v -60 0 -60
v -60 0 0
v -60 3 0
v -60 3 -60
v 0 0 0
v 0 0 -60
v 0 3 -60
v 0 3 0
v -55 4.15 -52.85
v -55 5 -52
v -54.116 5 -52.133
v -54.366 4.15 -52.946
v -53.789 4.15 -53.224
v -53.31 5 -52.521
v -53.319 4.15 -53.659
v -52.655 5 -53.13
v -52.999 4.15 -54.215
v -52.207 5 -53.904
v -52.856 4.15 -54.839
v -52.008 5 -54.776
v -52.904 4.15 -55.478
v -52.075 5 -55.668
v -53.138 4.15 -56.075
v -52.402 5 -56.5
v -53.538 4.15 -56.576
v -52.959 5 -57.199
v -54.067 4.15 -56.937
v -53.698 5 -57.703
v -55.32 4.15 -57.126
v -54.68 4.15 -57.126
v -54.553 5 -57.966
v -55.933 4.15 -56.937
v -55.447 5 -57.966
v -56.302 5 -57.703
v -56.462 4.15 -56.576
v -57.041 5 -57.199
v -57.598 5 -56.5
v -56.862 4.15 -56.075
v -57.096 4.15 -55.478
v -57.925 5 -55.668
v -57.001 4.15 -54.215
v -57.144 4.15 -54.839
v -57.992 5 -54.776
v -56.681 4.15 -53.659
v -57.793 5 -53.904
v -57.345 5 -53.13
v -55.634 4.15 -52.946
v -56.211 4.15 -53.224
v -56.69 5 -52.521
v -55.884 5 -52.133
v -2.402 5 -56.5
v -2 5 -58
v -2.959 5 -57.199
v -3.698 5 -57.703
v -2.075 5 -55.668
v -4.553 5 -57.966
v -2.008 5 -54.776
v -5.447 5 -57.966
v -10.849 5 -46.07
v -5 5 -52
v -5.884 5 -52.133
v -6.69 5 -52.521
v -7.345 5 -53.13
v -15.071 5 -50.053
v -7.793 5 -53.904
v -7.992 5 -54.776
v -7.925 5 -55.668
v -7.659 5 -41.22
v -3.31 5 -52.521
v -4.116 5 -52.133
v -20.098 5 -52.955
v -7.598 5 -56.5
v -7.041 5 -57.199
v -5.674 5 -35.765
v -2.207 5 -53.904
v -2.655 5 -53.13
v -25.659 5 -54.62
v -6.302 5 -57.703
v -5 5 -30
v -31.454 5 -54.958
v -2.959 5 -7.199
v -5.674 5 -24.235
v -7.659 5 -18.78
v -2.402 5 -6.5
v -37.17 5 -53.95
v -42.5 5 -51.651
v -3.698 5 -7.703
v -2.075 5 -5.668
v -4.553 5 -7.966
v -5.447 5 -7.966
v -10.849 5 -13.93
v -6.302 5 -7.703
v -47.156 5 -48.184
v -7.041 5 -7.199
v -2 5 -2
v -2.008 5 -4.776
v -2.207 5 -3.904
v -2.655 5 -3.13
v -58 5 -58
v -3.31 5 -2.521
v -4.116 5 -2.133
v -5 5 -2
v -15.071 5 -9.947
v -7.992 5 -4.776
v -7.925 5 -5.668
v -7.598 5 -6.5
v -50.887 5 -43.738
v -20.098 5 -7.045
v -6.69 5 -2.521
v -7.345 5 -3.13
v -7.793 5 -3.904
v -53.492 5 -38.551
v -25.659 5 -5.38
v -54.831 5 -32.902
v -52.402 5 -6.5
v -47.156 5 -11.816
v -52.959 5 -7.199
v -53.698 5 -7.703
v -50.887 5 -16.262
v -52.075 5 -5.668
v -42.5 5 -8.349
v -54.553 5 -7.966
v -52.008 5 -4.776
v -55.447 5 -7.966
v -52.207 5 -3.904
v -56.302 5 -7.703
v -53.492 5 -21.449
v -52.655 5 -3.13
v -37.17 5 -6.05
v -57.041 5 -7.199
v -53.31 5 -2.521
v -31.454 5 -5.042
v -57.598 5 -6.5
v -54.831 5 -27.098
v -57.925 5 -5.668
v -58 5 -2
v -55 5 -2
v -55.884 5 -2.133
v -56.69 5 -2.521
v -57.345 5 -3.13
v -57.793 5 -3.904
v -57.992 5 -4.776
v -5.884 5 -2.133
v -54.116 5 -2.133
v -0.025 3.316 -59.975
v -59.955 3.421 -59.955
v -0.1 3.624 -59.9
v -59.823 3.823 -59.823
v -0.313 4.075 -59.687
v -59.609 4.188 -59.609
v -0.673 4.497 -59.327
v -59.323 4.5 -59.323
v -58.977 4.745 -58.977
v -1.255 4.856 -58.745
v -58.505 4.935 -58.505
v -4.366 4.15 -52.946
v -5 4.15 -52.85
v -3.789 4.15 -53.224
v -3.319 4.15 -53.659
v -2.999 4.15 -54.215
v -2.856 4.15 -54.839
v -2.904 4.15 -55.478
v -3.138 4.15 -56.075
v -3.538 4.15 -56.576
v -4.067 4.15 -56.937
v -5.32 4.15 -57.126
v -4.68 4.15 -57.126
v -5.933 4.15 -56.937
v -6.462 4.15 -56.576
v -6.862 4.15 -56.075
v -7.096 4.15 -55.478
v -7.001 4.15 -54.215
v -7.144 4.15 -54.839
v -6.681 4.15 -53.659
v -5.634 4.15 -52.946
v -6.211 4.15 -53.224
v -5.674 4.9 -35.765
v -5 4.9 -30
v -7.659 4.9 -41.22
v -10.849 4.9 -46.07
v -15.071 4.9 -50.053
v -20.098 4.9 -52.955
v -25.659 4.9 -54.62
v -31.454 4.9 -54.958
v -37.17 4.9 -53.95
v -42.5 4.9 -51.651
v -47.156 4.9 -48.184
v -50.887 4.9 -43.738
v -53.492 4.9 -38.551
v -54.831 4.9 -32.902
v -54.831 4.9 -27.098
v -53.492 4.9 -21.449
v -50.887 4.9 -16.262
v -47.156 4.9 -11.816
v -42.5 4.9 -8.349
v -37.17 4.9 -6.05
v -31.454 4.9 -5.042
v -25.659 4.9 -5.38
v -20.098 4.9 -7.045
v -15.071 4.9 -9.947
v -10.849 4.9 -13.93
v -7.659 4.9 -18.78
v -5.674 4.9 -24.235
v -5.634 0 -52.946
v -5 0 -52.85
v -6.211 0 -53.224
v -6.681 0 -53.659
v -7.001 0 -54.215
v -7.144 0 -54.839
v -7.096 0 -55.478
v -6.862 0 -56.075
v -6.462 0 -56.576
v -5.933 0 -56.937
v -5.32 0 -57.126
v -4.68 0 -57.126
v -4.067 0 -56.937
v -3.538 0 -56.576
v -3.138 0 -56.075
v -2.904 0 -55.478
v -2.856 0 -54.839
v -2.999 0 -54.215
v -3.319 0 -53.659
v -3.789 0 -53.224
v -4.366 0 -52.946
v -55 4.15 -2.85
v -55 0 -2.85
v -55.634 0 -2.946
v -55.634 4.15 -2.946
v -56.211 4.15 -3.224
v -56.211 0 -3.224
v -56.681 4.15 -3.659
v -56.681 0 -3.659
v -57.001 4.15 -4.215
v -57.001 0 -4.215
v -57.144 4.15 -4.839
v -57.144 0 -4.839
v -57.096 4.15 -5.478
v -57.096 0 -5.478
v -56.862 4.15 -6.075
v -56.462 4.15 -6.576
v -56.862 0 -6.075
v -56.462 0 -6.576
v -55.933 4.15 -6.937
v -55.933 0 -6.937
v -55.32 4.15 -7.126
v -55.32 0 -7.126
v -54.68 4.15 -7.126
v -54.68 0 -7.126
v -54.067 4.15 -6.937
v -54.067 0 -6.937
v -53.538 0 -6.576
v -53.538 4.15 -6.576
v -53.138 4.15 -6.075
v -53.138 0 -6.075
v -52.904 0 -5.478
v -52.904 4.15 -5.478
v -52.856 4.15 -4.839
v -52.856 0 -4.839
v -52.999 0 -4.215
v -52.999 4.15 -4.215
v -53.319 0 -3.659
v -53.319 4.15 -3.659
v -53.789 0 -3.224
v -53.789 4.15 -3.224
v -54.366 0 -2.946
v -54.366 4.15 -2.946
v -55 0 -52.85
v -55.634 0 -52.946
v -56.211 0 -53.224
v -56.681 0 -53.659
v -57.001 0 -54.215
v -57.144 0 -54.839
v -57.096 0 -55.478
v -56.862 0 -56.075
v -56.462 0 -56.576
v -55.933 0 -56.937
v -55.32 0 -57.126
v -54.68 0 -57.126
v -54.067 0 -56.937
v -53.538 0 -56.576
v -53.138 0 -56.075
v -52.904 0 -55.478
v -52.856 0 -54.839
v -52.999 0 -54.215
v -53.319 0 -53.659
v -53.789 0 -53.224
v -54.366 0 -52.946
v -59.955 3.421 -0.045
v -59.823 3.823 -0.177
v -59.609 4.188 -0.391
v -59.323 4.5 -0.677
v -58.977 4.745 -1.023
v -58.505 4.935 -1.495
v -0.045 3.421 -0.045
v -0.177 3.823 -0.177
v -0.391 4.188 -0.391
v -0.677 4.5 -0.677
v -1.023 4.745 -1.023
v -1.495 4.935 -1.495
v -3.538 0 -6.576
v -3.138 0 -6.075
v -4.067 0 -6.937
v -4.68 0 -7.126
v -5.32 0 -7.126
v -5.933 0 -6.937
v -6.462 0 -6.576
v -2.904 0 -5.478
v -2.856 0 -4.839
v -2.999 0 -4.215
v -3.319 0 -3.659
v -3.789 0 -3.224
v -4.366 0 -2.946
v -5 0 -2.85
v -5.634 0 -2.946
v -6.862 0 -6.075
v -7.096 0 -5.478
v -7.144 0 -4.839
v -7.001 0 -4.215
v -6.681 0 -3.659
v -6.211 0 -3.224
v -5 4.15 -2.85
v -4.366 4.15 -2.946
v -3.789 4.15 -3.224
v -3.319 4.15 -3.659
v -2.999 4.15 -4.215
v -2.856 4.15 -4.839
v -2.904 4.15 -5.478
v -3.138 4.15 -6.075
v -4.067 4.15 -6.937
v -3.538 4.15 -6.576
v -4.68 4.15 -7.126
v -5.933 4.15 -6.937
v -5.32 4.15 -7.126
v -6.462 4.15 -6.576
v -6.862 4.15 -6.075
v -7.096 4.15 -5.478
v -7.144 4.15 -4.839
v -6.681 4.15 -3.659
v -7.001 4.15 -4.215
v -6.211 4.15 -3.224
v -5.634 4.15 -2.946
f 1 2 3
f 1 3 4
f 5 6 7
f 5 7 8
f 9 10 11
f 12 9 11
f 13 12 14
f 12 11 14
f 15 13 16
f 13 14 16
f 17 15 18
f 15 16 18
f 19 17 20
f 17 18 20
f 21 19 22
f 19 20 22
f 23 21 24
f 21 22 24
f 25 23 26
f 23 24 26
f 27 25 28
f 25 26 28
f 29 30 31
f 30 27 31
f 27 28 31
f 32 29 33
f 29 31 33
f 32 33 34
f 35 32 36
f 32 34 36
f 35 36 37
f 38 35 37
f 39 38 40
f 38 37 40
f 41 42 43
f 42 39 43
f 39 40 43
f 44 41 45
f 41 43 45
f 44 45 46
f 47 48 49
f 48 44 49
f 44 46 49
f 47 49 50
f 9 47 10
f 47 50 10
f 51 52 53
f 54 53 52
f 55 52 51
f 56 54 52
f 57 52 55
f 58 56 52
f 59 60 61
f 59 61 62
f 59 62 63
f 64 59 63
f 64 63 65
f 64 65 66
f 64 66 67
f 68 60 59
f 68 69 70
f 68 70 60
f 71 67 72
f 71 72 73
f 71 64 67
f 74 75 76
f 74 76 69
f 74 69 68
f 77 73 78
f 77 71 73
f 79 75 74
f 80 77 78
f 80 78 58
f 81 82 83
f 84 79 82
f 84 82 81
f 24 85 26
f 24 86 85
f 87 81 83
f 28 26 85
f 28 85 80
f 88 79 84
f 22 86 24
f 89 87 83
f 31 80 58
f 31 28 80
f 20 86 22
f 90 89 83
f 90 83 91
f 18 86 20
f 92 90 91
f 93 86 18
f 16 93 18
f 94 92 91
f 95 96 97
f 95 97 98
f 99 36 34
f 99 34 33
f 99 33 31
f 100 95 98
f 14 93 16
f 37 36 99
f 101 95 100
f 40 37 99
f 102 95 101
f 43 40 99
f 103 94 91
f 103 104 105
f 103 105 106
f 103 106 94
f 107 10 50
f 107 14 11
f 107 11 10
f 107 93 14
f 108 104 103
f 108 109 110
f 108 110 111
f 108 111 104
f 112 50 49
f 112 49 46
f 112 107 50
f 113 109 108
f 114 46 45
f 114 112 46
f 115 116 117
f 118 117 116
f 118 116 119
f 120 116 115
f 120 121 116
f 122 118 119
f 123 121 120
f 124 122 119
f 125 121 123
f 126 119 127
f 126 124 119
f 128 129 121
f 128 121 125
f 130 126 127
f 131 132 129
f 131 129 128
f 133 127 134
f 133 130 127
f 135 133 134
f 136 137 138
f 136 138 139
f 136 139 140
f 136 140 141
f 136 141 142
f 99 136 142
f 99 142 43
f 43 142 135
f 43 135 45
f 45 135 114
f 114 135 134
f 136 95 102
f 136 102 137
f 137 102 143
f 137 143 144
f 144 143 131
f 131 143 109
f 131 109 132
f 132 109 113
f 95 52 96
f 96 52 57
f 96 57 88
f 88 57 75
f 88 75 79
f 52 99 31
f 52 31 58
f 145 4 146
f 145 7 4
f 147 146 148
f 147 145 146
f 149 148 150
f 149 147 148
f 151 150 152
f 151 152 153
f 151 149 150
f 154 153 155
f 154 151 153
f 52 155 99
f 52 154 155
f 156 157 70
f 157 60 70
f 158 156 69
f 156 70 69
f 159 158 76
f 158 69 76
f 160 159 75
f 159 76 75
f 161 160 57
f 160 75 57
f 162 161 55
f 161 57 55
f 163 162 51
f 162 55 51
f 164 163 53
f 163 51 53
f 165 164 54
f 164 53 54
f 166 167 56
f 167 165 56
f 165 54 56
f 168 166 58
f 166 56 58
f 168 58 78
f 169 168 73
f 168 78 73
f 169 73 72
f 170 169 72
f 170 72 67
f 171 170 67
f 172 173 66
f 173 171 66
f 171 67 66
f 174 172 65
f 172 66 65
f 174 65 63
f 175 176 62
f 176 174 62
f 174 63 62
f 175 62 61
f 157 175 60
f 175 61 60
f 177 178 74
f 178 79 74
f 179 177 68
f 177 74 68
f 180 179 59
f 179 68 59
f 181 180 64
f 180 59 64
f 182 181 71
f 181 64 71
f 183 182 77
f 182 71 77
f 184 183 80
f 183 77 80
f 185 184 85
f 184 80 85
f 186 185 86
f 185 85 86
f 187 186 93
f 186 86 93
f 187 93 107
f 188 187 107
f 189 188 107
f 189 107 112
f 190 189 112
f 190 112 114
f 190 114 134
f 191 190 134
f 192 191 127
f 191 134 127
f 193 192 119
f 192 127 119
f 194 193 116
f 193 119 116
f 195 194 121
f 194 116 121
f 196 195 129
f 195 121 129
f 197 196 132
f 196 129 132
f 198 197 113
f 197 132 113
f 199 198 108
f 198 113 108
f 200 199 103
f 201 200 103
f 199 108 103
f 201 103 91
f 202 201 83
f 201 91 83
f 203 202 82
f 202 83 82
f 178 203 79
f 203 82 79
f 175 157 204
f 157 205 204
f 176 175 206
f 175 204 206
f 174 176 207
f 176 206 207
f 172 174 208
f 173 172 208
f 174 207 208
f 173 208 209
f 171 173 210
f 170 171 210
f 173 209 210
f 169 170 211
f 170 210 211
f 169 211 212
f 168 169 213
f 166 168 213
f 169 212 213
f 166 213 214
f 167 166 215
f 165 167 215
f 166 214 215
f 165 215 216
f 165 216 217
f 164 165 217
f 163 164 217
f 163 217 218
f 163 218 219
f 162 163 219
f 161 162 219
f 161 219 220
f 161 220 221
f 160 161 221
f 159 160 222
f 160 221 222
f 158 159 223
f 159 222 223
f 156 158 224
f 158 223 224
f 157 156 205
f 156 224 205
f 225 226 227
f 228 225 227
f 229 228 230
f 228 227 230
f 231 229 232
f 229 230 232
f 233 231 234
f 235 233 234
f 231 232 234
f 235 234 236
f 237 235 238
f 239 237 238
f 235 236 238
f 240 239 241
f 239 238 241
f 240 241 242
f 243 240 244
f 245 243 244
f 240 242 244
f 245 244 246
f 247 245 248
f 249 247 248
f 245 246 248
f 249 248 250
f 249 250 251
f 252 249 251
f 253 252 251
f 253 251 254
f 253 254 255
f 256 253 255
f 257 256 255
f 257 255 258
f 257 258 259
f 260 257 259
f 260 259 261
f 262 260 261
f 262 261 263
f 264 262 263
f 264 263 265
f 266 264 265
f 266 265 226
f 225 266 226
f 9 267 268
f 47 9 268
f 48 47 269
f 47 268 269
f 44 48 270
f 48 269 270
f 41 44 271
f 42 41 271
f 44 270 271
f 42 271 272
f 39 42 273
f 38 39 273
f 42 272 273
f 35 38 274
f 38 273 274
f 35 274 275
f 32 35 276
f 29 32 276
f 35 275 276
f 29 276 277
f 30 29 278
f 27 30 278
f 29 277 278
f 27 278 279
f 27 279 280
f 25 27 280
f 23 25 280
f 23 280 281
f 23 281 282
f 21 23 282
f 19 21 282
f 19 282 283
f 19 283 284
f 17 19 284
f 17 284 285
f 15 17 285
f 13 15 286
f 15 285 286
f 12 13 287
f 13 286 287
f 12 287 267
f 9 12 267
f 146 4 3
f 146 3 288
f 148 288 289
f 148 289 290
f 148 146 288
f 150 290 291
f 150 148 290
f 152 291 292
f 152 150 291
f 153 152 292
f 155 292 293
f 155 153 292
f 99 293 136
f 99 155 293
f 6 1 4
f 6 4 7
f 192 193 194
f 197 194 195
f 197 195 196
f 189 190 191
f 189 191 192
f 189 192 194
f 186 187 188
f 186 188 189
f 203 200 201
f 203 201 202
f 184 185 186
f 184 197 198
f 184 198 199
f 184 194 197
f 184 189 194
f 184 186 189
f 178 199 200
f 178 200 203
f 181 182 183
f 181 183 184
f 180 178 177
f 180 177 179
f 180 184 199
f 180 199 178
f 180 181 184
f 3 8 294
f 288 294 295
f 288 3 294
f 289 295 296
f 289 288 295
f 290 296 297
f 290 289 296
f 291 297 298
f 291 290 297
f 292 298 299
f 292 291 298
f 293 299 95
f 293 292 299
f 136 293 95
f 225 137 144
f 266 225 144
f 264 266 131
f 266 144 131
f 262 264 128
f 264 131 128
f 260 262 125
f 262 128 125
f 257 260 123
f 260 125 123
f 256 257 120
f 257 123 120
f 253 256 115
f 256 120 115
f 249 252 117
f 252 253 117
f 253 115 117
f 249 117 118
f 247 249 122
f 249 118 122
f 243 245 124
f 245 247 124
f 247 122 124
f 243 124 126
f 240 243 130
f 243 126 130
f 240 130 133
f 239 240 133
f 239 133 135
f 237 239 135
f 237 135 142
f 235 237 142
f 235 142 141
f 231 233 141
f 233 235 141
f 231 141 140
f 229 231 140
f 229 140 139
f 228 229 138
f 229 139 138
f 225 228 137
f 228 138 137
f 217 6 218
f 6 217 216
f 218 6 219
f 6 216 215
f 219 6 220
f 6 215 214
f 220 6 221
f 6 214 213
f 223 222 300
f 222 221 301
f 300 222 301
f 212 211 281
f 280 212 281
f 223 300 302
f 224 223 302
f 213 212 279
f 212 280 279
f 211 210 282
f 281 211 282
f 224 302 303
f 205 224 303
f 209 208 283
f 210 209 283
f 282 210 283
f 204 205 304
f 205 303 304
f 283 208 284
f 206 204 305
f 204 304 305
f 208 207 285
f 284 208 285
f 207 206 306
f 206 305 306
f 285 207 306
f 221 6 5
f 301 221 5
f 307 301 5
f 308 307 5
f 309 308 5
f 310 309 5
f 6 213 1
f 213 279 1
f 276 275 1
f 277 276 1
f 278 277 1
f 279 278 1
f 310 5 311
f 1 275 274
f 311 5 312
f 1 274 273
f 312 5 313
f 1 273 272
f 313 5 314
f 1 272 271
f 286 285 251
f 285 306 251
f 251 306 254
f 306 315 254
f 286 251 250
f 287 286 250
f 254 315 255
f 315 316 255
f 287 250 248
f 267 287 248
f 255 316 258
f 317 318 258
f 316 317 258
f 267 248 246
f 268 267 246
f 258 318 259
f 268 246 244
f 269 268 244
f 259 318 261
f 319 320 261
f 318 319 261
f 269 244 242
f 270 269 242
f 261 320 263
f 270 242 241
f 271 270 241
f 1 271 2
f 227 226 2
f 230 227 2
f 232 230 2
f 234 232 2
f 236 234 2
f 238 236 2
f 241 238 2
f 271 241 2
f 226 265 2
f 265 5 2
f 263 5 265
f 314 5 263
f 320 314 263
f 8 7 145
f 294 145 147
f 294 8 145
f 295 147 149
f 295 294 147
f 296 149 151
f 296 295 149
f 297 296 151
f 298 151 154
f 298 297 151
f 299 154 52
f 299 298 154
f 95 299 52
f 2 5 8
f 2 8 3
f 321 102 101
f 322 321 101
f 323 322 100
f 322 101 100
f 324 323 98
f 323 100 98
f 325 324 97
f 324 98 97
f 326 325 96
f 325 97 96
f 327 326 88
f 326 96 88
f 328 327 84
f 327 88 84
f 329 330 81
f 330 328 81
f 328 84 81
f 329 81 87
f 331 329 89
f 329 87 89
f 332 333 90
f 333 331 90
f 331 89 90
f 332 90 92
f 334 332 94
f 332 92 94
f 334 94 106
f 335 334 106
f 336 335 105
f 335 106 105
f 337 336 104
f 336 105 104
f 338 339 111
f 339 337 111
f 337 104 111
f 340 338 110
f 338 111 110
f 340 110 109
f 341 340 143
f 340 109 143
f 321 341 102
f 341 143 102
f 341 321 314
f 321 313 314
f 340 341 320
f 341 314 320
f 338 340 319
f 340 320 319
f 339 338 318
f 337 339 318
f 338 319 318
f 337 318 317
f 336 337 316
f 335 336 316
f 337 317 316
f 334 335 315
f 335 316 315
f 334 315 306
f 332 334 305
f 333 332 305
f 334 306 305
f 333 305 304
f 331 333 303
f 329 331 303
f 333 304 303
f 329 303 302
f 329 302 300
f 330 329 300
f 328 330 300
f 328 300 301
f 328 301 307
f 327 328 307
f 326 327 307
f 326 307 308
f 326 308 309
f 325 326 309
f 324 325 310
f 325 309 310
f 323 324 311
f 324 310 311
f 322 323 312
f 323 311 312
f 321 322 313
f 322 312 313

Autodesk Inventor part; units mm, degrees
ref_plane "YZ Plane" through (0, 0, 0) normal (1, 0, 0) x (0, 1, 0)
ref_plane "XZ Plane" through (0, 0, 0) normal (0, 1, 0) x (-1, 0, 0)
ref_plane "XY Plane" through (0, 0, 0) normal (0, 0, 1) x (1, 0, 0)
sketch "Sketch1" plane through (0, 0, 0) normal (0, 1, 0) x (-1, 0, 0)
  line L0 (0, 0) -> (60, 0)
  line L1 (60, 0) -> (60, -60)
  line L2 (60, -60) -> (0, -60)
  line L3 (0, -60) -> (0, 0)
  dimension "d0" = 60
  dimension "d1" = 60
extrude "Extrusion1" add sketch "Sketch1" along normal blind 5
sketch "Sketch2" plane through (0, 5, 0) normal (0, 1, 0) x (1, 0, 0)
  line L0 (-60, 0) -> (0, 0) projected
  line L1 (0, 0) -> (0, 60) projected
  line L2 (0, 60) -> (-60, 60) projected
  line L3 (-60, 60) -> (-60, 0) projected
  point P0 (-5, 5)
  point P1 (-5, 55)
  point P2 (-55, 55)
  point P3 (-55, 5)
  dimension "d4" = 5
  dimension "d6" = 5
  dimension "d7" = 5
  dimension "d8" = 5
  dimension "d9" = 5
  dimension "d10" = 5
  dimension "d11" = 5
  dimension "d12" = 5
hole "Hole1" at (-5, 5, -5) at (-5, 5, -55) at (-55, 5, -55) at (-55, 5, -5) direction (0, -1, 0) diameter 4.3 end through all countersink diameter 6 countersink angle 90
fillet "Fillet1" radius 2 4 edges at (-30, 5, 0) (-60, 5, -30) (-30, 5, -60) (0, 5, -30)
sketch "Sketch3" plane through (0, 5, 0) normal (0, 1, 0) x (1, 0, 0)
  circle A0 centre (-30, 30) radius 25
  line L0 (-60, 0) -> (0, 0) projected
  line L1 (-60, 60) -> (-60, 0) projected
  dimension "d21" = 30
  dimension "d22" = 30
  dimension "d23" = 50
extrude "Extrusion2" cut sketch "Sketch3" against normal blind 0.1
properties part number "Filter"
